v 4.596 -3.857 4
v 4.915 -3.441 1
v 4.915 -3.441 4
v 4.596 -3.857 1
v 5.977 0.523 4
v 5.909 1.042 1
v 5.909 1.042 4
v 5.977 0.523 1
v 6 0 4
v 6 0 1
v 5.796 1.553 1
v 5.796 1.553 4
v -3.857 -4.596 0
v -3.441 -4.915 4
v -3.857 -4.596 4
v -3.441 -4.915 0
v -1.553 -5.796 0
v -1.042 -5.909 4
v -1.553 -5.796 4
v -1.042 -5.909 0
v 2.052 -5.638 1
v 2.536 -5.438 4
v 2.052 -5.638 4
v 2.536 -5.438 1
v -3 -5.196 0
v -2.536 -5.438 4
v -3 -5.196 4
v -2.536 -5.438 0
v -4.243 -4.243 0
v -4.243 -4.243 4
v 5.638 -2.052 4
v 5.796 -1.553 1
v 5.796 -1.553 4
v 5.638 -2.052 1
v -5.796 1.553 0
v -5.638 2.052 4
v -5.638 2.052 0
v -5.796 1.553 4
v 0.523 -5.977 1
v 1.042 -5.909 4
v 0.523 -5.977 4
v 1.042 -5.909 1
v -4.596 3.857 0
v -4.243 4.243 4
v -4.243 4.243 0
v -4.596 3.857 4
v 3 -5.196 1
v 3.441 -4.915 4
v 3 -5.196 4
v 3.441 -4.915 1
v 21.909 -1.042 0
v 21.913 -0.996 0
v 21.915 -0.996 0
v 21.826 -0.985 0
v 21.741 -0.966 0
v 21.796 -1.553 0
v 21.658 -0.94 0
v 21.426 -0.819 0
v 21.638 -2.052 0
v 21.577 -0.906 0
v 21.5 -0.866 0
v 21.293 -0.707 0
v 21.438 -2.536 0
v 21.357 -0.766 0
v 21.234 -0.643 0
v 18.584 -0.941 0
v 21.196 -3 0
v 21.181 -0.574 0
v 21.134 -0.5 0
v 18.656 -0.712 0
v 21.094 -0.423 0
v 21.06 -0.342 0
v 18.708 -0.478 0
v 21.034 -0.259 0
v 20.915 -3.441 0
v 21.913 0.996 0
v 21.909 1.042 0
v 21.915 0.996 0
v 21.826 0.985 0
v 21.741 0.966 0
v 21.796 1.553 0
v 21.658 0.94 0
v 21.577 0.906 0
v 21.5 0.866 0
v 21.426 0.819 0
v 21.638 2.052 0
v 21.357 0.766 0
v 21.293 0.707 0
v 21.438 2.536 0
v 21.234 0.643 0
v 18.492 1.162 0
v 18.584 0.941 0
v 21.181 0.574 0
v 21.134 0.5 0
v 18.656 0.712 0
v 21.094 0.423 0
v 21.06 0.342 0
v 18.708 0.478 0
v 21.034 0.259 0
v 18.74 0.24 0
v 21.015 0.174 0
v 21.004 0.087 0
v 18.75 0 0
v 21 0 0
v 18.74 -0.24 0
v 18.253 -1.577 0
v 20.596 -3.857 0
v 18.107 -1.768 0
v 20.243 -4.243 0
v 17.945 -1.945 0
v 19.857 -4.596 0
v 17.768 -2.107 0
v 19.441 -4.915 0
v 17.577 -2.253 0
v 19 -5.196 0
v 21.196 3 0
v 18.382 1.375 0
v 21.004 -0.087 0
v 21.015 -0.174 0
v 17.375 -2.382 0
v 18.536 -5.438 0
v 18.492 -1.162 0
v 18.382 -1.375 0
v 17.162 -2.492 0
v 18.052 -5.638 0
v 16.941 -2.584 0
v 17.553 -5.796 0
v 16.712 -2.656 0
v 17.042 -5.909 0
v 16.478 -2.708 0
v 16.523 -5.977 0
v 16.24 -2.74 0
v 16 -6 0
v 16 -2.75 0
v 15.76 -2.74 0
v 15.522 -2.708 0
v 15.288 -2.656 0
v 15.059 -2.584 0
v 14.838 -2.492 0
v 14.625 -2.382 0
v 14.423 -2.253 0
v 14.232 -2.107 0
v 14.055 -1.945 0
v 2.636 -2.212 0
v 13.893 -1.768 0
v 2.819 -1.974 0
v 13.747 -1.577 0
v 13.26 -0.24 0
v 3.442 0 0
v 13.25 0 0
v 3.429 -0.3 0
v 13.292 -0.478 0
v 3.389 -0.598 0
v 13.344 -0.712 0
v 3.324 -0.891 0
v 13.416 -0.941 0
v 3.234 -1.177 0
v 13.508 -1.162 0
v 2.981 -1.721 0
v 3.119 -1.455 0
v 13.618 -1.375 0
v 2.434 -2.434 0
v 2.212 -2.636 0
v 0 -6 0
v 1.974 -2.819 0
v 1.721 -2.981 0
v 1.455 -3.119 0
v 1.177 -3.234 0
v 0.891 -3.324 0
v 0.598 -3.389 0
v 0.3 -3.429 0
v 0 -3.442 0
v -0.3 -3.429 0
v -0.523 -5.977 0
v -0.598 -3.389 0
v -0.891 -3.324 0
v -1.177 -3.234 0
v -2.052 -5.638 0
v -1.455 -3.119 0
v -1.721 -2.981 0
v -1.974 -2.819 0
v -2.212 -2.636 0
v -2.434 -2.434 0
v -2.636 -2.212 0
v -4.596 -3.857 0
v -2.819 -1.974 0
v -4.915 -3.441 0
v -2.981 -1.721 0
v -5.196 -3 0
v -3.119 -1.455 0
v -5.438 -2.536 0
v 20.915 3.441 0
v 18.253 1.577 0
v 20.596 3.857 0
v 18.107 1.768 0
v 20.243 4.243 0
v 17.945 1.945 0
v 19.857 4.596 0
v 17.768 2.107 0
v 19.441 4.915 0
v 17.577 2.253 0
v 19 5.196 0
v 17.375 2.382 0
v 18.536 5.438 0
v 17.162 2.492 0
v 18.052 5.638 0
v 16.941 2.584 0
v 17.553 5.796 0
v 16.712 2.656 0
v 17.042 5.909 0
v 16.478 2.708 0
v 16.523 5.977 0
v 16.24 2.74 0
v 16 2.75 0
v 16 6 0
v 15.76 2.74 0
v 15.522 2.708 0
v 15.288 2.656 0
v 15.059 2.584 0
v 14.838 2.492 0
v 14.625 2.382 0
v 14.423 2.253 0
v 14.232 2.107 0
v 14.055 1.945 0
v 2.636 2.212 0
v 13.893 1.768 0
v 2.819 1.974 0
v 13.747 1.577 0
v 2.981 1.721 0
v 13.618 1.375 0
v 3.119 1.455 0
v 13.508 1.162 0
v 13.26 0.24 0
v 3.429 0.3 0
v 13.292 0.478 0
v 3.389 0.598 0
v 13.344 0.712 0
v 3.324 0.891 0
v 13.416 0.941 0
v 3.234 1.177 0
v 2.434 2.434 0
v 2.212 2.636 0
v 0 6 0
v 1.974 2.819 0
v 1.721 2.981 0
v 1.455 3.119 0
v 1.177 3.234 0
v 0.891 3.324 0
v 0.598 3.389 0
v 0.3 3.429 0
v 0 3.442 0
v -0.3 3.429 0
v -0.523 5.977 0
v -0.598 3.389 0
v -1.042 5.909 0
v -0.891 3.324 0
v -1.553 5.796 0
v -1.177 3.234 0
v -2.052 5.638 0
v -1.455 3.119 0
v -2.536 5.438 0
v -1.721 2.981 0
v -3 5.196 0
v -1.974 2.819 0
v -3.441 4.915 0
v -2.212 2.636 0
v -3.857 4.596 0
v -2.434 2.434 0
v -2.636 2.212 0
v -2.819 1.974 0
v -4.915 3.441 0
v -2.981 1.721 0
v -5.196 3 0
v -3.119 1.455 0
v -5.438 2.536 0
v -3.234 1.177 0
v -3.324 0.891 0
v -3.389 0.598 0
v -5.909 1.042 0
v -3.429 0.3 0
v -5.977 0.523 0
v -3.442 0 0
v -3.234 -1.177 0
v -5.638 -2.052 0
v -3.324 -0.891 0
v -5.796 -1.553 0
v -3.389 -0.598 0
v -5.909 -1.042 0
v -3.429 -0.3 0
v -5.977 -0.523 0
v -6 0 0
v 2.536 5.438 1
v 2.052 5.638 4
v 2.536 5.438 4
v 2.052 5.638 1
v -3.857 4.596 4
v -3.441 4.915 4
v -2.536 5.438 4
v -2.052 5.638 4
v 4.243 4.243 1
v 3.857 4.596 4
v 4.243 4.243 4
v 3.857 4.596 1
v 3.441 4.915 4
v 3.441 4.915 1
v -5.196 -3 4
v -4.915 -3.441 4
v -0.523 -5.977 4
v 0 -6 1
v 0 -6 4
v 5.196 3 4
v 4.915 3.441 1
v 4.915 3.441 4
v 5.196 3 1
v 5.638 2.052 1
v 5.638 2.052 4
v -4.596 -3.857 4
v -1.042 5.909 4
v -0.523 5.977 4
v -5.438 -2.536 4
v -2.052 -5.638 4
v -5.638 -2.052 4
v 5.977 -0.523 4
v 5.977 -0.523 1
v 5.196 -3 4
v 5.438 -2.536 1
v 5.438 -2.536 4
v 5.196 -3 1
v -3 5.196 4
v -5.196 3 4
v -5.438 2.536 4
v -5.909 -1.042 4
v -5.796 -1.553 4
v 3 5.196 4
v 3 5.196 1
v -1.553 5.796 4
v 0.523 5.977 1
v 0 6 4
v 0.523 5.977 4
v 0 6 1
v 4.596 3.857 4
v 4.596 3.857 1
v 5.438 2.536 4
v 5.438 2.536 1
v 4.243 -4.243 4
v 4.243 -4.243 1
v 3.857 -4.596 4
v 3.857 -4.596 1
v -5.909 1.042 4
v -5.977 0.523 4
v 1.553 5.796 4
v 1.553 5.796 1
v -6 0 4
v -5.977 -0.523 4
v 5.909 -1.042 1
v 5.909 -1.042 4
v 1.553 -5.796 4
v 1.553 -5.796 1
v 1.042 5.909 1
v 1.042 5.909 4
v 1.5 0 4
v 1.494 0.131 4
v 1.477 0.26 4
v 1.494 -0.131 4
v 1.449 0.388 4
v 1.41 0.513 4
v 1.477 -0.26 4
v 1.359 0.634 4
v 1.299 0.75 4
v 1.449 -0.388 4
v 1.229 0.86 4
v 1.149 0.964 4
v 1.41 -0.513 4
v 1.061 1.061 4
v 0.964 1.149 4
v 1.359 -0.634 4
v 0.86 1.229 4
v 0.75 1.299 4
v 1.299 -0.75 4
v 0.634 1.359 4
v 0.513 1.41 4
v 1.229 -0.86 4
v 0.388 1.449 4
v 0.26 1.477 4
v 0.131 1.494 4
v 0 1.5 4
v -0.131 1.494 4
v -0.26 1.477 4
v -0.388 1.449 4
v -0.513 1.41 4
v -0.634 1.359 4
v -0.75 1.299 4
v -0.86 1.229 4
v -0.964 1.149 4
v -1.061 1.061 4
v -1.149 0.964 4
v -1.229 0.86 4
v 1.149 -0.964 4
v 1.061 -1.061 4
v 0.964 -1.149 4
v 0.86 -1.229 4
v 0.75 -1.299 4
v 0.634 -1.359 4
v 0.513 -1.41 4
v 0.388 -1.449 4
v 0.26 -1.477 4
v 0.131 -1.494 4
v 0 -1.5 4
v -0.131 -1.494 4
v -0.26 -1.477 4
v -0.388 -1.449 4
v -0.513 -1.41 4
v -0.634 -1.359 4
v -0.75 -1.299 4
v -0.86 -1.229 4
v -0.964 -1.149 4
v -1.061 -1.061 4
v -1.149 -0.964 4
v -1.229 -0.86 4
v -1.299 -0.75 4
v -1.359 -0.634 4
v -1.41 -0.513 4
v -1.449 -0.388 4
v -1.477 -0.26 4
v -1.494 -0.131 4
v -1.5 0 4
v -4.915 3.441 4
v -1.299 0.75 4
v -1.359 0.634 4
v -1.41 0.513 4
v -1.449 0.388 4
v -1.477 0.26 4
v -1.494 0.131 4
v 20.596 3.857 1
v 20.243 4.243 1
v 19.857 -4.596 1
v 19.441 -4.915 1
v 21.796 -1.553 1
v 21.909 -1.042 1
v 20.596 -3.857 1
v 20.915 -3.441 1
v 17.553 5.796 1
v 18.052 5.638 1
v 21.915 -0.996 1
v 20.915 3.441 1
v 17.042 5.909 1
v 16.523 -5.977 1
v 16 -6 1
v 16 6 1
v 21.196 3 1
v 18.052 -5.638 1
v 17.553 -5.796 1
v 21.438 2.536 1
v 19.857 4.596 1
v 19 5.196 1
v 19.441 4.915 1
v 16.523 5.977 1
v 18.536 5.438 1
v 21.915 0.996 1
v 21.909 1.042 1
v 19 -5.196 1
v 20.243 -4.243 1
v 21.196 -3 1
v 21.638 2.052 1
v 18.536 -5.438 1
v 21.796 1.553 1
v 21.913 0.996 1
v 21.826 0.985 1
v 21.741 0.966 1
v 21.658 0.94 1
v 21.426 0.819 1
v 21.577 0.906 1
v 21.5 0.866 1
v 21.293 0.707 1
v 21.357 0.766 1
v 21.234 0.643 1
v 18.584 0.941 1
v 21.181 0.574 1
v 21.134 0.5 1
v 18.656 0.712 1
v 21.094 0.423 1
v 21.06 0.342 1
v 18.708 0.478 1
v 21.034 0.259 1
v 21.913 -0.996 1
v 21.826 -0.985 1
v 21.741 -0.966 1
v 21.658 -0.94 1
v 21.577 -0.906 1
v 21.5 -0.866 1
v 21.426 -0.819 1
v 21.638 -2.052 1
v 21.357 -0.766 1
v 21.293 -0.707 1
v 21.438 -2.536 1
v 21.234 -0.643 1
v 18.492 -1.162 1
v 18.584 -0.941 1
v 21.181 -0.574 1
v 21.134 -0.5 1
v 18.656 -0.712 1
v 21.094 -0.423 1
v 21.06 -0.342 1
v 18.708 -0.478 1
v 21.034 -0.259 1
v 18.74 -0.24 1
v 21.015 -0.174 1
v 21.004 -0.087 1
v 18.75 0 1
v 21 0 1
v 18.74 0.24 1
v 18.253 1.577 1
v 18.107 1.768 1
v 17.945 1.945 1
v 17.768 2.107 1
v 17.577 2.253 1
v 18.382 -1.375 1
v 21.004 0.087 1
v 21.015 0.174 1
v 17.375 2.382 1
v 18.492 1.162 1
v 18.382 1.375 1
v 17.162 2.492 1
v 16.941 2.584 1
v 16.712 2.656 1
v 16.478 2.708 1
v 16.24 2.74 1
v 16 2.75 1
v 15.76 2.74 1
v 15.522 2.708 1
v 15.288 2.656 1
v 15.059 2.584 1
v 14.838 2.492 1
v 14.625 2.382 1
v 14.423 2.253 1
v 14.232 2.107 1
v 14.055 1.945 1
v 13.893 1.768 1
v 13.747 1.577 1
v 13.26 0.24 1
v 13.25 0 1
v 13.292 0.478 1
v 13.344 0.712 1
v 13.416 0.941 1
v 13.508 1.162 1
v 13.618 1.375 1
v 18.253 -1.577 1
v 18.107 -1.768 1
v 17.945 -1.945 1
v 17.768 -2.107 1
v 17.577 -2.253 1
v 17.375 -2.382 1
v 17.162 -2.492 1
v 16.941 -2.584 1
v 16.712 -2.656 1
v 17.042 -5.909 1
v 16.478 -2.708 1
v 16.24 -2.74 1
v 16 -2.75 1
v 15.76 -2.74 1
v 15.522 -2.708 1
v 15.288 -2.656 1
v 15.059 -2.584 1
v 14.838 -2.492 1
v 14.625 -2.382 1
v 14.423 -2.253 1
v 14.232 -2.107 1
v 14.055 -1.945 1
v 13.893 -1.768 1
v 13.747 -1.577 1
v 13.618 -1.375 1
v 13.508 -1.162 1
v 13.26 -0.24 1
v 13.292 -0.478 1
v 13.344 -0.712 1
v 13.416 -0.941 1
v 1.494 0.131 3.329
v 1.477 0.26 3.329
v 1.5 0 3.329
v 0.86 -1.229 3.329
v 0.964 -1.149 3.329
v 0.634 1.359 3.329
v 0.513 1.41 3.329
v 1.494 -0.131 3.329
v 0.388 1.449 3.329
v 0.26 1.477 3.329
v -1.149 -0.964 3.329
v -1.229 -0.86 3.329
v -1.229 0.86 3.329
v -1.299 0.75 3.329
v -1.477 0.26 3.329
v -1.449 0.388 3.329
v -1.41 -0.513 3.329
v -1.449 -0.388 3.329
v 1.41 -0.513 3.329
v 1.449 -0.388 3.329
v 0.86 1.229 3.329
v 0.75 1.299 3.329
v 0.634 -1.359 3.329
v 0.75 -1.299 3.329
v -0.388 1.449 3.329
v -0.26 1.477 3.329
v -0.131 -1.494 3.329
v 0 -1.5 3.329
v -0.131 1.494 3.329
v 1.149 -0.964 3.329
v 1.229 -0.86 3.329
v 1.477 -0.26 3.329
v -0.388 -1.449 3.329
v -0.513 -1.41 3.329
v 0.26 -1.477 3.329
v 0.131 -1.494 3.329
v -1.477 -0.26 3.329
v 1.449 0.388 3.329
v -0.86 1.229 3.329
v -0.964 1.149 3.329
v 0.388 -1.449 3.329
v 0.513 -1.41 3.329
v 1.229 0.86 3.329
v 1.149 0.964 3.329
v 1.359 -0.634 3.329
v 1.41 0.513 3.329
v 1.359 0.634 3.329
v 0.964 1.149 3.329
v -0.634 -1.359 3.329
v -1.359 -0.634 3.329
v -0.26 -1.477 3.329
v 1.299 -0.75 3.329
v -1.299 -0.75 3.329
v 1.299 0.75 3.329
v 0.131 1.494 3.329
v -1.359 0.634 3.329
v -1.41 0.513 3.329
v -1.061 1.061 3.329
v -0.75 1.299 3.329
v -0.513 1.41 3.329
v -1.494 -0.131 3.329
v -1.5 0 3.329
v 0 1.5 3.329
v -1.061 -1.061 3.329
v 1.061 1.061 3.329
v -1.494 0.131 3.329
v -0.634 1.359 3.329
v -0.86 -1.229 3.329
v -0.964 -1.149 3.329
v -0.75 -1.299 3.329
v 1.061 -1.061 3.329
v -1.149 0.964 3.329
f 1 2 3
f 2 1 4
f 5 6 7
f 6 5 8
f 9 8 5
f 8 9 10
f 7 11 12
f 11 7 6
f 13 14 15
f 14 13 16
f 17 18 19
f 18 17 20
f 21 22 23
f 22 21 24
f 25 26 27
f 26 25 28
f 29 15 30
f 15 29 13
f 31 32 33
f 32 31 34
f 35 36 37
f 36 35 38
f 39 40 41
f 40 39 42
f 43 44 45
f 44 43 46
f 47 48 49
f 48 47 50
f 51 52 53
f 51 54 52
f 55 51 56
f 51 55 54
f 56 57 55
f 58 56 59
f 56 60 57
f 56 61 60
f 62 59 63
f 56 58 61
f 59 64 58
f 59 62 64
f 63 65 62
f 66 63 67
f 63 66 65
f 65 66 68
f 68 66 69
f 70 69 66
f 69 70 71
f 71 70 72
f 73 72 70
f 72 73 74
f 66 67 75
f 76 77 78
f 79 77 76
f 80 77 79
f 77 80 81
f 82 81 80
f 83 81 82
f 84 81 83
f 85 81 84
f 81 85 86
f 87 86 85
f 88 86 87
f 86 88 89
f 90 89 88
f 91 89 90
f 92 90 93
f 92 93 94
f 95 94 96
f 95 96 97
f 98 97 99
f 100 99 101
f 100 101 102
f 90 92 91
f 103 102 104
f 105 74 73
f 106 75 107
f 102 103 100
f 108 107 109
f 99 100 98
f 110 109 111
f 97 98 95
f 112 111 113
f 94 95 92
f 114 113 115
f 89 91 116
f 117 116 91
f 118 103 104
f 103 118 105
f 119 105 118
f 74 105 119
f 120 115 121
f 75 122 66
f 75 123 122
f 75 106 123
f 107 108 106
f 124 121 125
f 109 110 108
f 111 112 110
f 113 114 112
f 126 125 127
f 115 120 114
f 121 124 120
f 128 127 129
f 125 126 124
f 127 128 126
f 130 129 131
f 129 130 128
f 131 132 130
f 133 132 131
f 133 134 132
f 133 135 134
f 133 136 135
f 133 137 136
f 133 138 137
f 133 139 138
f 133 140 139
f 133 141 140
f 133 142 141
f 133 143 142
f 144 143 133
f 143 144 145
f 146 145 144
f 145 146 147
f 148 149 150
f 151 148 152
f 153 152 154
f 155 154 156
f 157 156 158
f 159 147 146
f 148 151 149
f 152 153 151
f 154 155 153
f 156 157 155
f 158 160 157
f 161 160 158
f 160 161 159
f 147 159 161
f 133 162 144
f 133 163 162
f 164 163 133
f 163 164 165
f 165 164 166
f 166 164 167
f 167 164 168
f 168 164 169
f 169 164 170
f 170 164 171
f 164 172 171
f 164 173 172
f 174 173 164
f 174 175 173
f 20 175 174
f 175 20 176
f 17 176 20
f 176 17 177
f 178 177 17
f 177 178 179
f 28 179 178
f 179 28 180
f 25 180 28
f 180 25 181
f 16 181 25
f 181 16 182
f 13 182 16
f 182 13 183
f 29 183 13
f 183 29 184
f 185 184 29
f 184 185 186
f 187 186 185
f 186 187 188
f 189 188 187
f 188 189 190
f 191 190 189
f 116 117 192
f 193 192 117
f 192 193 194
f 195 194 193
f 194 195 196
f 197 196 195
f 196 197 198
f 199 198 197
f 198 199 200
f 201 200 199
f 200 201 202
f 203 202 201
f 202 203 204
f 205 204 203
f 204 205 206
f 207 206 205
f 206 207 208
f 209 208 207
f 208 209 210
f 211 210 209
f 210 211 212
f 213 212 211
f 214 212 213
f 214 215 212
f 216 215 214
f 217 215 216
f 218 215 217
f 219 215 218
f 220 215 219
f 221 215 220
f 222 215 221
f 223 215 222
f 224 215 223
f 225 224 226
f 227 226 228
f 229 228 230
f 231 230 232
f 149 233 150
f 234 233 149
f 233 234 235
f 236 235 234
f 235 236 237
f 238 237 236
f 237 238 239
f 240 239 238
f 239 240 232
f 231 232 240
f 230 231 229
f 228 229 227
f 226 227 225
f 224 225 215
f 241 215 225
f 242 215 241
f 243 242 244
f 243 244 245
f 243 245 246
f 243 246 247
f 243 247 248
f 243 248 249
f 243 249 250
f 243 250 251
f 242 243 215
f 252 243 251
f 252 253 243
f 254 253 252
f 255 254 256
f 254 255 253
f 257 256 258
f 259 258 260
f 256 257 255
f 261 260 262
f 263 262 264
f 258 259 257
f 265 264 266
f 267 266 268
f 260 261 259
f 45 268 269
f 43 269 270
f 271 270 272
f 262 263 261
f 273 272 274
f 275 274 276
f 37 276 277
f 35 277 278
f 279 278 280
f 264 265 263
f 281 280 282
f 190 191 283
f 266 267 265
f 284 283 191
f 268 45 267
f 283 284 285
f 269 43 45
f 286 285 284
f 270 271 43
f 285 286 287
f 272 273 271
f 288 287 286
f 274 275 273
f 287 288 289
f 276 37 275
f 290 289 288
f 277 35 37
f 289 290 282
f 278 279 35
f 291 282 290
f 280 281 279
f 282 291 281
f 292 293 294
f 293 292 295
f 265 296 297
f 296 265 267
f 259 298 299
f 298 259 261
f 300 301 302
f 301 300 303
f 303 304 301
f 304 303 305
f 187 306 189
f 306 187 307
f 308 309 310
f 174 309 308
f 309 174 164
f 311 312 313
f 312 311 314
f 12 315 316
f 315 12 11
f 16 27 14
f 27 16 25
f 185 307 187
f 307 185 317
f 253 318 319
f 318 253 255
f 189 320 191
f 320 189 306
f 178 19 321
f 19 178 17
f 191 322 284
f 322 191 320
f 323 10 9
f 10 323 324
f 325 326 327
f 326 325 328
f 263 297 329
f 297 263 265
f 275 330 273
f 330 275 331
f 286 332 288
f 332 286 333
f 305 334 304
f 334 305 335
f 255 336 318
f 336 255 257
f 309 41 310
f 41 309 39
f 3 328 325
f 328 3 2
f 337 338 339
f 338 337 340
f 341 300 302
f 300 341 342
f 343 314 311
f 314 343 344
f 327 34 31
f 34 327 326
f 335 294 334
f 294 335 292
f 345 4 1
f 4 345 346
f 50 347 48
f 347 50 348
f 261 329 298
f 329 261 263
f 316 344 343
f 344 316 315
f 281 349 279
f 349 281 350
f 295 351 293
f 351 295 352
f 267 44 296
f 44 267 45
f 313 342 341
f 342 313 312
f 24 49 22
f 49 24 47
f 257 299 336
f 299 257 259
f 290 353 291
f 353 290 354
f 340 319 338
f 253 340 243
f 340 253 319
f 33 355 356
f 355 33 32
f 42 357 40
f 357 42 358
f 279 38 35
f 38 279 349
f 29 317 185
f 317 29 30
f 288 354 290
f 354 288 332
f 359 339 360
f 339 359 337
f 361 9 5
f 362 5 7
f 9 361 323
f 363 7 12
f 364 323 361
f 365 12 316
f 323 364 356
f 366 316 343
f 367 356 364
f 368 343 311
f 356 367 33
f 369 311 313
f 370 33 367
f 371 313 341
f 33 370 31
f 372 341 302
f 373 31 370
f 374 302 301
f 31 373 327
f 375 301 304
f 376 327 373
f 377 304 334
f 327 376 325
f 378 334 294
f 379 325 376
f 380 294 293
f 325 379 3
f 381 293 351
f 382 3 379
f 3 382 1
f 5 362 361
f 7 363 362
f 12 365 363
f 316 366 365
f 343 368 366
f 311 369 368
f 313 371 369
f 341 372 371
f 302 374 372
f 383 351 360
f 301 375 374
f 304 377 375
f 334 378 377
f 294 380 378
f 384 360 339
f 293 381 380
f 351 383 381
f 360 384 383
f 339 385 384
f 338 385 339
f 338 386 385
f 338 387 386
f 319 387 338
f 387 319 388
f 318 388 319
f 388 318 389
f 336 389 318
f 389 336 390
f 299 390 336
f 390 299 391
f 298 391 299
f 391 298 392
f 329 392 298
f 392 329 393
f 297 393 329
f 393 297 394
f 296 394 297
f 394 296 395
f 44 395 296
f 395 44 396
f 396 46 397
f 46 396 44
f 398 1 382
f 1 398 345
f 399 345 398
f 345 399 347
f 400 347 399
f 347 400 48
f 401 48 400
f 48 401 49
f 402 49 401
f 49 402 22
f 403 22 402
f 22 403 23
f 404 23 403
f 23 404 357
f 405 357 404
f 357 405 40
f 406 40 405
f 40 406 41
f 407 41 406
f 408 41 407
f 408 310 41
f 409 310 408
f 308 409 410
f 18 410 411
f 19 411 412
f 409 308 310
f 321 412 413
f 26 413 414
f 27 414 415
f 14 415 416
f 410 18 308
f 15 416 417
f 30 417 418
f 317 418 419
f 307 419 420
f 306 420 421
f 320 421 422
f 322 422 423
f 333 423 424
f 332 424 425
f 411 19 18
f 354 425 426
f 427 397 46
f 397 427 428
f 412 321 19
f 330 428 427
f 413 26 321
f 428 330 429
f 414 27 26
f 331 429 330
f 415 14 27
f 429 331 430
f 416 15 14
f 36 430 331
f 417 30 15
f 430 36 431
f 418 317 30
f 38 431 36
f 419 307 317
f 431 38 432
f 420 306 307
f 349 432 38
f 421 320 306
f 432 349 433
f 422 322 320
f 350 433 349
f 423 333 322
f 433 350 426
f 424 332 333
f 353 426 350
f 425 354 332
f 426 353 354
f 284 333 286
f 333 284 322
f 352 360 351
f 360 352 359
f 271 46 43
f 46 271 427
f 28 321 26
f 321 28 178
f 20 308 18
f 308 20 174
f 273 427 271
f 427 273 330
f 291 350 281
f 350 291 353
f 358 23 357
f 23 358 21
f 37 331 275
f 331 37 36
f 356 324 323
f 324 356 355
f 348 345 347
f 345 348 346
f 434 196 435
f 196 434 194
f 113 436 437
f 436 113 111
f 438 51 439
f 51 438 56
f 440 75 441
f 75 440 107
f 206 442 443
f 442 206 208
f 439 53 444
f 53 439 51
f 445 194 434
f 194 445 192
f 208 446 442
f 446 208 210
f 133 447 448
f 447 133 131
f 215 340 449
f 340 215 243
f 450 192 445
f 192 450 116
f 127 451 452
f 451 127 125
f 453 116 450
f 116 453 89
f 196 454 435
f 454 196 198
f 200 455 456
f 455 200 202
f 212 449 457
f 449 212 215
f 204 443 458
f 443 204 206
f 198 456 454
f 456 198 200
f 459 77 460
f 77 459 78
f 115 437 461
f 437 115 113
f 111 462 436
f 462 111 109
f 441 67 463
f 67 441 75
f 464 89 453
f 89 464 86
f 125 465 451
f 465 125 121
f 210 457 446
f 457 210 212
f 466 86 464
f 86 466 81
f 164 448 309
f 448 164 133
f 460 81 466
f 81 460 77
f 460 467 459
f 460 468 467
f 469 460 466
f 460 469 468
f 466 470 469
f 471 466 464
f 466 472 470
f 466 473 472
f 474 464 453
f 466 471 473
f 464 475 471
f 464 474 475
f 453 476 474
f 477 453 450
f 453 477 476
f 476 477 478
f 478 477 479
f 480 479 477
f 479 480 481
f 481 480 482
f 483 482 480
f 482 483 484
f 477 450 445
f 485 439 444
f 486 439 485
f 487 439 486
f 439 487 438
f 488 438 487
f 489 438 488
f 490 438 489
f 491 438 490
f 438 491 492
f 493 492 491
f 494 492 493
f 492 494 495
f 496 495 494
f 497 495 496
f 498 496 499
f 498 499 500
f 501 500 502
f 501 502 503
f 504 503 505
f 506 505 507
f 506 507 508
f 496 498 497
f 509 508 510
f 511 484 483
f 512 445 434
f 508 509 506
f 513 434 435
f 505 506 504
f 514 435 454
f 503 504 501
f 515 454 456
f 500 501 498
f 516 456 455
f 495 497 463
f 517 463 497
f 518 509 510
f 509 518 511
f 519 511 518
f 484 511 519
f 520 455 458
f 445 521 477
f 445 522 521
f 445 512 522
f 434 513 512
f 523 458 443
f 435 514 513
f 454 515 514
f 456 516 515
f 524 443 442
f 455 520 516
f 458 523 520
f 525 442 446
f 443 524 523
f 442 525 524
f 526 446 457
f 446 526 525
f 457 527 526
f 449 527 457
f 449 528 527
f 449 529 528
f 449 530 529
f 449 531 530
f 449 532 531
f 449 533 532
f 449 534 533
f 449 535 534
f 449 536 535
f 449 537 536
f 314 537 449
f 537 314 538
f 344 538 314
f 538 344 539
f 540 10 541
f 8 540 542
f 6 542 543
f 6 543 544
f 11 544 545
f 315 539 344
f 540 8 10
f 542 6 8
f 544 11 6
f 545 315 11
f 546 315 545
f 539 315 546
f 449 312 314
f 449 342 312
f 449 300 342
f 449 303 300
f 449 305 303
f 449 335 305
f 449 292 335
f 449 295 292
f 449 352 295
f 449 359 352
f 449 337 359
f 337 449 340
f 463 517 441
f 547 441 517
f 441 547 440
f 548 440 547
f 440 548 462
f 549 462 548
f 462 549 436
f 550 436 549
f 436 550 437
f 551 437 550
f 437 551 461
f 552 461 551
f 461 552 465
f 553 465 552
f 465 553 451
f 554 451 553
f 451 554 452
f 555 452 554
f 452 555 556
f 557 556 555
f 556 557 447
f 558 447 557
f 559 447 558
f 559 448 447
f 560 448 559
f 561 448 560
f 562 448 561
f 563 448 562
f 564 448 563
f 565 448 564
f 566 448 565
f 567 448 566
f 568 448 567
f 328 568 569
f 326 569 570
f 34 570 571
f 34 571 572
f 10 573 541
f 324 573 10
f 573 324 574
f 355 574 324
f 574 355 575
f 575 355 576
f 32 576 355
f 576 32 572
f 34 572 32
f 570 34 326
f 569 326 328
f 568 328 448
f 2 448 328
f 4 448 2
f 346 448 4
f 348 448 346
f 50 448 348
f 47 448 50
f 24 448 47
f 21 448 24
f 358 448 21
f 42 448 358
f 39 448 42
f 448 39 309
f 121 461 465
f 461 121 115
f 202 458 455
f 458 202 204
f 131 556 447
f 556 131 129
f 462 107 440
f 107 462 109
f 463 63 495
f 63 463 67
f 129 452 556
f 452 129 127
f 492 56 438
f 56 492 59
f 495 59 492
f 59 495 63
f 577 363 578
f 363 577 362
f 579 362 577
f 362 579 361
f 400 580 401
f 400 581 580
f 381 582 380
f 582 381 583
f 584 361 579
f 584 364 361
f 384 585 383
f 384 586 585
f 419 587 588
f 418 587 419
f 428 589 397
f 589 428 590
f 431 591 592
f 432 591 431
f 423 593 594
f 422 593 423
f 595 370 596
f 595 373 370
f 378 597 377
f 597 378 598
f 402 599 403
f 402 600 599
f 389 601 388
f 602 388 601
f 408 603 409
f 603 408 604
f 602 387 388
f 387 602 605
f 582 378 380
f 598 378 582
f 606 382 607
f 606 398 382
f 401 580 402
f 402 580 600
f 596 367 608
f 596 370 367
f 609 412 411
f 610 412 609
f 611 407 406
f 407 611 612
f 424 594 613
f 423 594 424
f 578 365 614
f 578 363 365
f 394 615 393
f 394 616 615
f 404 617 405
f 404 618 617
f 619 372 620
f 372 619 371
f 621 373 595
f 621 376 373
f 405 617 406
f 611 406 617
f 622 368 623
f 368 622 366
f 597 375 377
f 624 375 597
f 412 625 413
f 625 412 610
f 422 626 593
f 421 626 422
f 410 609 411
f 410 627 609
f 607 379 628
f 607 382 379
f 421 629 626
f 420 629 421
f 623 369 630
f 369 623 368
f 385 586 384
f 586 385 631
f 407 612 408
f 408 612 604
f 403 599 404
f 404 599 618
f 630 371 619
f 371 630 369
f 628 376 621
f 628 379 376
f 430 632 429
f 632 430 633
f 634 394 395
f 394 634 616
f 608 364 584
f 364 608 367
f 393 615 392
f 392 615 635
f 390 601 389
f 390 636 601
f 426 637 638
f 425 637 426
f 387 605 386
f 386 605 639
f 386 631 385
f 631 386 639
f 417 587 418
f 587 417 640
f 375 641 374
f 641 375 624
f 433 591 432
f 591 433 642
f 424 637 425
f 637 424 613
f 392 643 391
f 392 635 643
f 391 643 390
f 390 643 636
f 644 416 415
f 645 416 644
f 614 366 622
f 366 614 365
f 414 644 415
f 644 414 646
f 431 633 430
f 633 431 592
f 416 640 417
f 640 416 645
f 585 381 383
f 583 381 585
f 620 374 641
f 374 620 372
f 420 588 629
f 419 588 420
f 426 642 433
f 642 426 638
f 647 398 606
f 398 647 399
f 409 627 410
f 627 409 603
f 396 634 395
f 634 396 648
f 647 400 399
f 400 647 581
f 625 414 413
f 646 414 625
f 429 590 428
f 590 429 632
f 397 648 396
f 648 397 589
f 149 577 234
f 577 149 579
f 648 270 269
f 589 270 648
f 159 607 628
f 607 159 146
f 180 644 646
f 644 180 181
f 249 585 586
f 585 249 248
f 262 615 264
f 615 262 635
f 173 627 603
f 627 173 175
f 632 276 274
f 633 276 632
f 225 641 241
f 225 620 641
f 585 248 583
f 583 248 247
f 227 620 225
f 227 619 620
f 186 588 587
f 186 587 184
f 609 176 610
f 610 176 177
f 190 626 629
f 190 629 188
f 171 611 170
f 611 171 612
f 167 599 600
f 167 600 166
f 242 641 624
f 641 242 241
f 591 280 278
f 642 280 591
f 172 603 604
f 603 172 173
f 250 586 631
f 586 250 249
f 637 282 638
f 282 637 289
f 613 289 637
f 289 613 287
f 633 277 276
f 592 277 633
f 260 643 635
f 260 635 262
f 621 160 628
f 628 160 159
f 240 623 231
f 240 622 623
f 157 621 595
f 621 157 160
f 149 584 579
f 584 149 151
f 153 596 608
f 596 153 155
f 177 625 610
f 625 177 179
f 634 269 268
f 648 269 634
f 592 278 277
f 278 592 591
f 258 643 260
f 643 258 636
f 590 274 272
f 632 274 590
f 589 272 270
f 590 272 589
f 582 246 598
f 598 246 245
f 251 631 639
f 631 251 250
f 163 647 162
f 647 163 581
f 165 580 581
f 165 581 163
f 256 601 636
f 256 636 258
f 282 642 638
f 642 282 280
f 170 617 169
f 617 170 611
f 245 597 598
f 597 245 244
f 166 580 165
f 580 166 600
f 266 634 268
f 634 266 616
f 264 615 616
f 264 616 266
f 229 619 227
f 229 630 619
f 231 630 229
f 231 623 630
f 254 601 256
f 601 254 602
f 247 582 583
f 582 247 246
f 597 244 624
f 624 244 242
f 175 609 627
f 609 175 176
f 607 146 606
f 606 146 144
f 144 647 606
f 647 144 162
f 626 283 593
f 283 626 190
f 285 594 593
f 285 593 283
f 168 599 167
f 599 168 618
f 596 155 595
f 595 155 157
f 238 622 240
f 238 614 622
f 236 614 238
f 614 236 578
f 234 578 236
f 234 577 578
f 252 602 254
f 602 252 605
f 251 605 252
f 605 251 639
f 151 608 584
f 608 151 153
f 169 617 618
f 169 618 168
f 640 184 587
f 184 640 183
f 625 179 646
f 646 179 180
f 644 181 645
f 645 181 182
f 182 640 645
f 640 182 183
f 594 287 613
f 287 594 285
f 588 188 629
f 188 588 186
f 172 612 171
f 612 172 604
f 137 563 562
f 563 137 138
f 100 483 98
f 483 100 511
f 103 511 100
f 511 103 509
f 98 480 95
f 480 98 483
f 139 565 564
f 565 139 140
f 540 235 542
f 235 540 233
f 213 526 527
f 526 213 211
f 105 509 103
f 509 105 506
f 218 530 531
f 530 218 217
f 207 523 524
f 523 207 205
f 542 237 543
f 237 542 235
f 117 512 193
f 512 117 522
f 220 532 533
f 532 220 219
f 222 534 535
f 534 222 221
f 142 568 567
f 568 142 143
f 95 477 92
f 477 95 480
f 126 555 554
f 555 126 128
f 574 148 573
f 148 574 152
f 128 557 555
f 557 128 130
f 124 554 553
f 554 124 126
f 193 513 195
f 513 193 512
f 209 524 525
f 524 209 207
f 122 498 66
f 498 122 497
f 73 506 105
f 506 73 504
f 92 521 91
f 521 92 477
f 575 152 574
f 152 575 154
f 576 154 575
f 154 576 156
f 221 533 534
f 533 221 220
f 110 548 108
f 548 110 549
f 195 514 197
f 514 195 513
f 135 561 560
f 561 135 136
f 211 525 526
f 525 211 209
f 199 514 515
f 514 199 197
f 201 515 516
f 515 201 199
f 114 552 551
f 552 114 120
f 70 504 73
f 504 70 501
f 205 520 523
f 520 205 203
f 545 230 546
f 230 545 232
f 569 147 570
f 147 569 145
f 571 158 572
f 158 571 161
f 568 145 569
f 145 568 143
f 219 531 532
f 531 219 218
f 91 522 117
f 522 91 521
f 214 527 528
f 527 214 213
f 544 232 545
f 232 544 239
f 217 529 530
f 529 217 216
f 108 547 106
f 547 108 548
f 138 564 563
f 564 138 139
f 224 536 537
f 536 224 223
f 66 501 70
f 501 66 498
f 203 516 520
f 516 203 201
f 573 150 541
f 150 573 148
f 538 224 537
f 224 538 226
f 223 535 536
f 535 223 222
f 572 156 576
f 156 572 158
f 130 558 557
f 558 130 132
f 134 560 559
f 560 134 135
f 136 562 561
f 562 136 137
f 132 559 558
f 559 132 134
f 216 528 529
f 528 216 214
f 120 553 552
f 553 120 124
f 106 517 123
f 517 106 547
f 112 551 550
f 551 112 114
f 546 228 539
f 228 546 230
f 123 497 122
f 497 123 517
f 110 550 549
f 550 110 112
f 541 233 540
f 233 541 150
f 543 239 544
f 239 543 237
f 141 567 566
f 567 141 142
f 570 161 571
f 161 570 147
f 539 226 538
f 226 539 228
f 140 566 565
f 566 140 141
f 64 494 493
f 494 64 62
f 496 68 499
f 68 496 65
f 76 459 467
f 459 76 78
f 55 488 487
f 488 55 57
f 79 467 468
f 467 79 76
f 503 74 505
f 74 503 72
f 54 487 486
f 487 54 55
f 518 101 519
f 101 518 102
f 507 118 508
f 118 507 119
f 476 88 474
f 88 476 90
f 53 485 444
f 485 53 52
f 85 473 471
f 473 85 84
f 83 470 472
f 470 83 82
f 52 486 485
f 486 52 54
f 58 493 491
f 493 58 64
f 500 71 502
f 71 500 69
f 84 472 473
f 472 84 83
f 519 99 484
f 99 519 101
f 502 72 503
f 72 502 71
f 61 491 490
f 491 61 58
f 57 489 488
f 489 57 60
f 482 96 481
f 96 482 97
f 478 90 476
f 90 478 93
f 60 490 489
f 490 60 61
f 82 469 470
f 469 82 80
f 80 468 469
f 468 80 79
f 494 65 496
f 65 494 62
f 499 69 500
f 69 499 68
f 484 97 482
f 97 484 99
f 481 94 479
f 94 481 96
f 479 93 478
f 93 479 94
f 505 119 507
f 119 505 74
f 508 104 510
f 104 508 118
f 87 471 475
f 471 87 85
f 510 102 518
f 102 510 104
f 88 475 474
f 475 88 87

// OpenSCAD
// Wall clip for Home Assistant Yellow
//
// Copyright (C) 2023 Michiel Fokke <michiel@fokke.org>
//
// This program is free software: you can redistribute it and/or modify
// it under the terms of the GNU General Public License as published by
// the Free Software Foundation, either version 3 of the License, or
// (at your option) any later version.

// This program is distributed in the hope that it will be useful,
// but WITHOUT ANY WARRANTY; without even the implied warranty of
// MERCHANTABILITY or FITNESS FOR A PARTICULAR PURPOSE.  See the
// GNU General Public License for more details.

// You should have received a copy of the GNU General Public License
// along with this program.  If not, see <http://www.gnu.org/licenses/>.

$fn = 72;
TOL = .1;

BASE_X = 28;
BASE_Z = 1;
BASE_D = 12;

CASE_SCREW_Z = 3;

WALL_SCREW_INNER_D = 3;
WALL_SCREW_OUTER_D = 7;
WALL_SCREW_CONE_Z = 6;

NOTCH_X = 5;
NOTCH_D = 2;
NOTCH_R_SCREW = 5;
SCREW_D = 5.5;

module base(x, d, h) {
    hull() {
        cylinder(d=d, h=h);
        translate([x - d, 0, 0])
        cylinder(d=d, h=h);        
    }
}

module wall_clip_base() {
    base(BASE_X, BASE_D, BASE_Z);
}

module screw_hole() {
    translate([BASE_X - BASE_D, 0, 0])
        cylinder(d=SCREW_D, h=BASE_Z + 2*TOL);
}

module wall_screw_hole() {
    cylinder(d=WALL_SCREW_INNER_D, h= BASE_Z + CASE_SCREW_Z + 2*TOL);
            cylinder(d2=0, d1=WALL_SCREW_OUTER_D, h=WALL_SCREW_CONE_Z);
}

module screw_base() {
    cylinder(d=BASE_D, h=BASE_Z + CASE_SCREW_Z);
}

module notch_hole() {
    base(NOTCH_X, NOTCH_D, BASE_Z + 2*TOL);
}

module wall_clip() {
    difference() {
        union() {
            screw_base();
            wall_clip_base();
        }
        translate([0, 0, -TOL]) {
            screw_hole();
            wall_screw_hole();
            translate([BASE_X - (BASE_D - NOTCH_D)/2 - (BASE_D/2 - NOTCH_R_SCREW), 0, 0])
                notch_hole();
        }
    }
}

wall_clip();
